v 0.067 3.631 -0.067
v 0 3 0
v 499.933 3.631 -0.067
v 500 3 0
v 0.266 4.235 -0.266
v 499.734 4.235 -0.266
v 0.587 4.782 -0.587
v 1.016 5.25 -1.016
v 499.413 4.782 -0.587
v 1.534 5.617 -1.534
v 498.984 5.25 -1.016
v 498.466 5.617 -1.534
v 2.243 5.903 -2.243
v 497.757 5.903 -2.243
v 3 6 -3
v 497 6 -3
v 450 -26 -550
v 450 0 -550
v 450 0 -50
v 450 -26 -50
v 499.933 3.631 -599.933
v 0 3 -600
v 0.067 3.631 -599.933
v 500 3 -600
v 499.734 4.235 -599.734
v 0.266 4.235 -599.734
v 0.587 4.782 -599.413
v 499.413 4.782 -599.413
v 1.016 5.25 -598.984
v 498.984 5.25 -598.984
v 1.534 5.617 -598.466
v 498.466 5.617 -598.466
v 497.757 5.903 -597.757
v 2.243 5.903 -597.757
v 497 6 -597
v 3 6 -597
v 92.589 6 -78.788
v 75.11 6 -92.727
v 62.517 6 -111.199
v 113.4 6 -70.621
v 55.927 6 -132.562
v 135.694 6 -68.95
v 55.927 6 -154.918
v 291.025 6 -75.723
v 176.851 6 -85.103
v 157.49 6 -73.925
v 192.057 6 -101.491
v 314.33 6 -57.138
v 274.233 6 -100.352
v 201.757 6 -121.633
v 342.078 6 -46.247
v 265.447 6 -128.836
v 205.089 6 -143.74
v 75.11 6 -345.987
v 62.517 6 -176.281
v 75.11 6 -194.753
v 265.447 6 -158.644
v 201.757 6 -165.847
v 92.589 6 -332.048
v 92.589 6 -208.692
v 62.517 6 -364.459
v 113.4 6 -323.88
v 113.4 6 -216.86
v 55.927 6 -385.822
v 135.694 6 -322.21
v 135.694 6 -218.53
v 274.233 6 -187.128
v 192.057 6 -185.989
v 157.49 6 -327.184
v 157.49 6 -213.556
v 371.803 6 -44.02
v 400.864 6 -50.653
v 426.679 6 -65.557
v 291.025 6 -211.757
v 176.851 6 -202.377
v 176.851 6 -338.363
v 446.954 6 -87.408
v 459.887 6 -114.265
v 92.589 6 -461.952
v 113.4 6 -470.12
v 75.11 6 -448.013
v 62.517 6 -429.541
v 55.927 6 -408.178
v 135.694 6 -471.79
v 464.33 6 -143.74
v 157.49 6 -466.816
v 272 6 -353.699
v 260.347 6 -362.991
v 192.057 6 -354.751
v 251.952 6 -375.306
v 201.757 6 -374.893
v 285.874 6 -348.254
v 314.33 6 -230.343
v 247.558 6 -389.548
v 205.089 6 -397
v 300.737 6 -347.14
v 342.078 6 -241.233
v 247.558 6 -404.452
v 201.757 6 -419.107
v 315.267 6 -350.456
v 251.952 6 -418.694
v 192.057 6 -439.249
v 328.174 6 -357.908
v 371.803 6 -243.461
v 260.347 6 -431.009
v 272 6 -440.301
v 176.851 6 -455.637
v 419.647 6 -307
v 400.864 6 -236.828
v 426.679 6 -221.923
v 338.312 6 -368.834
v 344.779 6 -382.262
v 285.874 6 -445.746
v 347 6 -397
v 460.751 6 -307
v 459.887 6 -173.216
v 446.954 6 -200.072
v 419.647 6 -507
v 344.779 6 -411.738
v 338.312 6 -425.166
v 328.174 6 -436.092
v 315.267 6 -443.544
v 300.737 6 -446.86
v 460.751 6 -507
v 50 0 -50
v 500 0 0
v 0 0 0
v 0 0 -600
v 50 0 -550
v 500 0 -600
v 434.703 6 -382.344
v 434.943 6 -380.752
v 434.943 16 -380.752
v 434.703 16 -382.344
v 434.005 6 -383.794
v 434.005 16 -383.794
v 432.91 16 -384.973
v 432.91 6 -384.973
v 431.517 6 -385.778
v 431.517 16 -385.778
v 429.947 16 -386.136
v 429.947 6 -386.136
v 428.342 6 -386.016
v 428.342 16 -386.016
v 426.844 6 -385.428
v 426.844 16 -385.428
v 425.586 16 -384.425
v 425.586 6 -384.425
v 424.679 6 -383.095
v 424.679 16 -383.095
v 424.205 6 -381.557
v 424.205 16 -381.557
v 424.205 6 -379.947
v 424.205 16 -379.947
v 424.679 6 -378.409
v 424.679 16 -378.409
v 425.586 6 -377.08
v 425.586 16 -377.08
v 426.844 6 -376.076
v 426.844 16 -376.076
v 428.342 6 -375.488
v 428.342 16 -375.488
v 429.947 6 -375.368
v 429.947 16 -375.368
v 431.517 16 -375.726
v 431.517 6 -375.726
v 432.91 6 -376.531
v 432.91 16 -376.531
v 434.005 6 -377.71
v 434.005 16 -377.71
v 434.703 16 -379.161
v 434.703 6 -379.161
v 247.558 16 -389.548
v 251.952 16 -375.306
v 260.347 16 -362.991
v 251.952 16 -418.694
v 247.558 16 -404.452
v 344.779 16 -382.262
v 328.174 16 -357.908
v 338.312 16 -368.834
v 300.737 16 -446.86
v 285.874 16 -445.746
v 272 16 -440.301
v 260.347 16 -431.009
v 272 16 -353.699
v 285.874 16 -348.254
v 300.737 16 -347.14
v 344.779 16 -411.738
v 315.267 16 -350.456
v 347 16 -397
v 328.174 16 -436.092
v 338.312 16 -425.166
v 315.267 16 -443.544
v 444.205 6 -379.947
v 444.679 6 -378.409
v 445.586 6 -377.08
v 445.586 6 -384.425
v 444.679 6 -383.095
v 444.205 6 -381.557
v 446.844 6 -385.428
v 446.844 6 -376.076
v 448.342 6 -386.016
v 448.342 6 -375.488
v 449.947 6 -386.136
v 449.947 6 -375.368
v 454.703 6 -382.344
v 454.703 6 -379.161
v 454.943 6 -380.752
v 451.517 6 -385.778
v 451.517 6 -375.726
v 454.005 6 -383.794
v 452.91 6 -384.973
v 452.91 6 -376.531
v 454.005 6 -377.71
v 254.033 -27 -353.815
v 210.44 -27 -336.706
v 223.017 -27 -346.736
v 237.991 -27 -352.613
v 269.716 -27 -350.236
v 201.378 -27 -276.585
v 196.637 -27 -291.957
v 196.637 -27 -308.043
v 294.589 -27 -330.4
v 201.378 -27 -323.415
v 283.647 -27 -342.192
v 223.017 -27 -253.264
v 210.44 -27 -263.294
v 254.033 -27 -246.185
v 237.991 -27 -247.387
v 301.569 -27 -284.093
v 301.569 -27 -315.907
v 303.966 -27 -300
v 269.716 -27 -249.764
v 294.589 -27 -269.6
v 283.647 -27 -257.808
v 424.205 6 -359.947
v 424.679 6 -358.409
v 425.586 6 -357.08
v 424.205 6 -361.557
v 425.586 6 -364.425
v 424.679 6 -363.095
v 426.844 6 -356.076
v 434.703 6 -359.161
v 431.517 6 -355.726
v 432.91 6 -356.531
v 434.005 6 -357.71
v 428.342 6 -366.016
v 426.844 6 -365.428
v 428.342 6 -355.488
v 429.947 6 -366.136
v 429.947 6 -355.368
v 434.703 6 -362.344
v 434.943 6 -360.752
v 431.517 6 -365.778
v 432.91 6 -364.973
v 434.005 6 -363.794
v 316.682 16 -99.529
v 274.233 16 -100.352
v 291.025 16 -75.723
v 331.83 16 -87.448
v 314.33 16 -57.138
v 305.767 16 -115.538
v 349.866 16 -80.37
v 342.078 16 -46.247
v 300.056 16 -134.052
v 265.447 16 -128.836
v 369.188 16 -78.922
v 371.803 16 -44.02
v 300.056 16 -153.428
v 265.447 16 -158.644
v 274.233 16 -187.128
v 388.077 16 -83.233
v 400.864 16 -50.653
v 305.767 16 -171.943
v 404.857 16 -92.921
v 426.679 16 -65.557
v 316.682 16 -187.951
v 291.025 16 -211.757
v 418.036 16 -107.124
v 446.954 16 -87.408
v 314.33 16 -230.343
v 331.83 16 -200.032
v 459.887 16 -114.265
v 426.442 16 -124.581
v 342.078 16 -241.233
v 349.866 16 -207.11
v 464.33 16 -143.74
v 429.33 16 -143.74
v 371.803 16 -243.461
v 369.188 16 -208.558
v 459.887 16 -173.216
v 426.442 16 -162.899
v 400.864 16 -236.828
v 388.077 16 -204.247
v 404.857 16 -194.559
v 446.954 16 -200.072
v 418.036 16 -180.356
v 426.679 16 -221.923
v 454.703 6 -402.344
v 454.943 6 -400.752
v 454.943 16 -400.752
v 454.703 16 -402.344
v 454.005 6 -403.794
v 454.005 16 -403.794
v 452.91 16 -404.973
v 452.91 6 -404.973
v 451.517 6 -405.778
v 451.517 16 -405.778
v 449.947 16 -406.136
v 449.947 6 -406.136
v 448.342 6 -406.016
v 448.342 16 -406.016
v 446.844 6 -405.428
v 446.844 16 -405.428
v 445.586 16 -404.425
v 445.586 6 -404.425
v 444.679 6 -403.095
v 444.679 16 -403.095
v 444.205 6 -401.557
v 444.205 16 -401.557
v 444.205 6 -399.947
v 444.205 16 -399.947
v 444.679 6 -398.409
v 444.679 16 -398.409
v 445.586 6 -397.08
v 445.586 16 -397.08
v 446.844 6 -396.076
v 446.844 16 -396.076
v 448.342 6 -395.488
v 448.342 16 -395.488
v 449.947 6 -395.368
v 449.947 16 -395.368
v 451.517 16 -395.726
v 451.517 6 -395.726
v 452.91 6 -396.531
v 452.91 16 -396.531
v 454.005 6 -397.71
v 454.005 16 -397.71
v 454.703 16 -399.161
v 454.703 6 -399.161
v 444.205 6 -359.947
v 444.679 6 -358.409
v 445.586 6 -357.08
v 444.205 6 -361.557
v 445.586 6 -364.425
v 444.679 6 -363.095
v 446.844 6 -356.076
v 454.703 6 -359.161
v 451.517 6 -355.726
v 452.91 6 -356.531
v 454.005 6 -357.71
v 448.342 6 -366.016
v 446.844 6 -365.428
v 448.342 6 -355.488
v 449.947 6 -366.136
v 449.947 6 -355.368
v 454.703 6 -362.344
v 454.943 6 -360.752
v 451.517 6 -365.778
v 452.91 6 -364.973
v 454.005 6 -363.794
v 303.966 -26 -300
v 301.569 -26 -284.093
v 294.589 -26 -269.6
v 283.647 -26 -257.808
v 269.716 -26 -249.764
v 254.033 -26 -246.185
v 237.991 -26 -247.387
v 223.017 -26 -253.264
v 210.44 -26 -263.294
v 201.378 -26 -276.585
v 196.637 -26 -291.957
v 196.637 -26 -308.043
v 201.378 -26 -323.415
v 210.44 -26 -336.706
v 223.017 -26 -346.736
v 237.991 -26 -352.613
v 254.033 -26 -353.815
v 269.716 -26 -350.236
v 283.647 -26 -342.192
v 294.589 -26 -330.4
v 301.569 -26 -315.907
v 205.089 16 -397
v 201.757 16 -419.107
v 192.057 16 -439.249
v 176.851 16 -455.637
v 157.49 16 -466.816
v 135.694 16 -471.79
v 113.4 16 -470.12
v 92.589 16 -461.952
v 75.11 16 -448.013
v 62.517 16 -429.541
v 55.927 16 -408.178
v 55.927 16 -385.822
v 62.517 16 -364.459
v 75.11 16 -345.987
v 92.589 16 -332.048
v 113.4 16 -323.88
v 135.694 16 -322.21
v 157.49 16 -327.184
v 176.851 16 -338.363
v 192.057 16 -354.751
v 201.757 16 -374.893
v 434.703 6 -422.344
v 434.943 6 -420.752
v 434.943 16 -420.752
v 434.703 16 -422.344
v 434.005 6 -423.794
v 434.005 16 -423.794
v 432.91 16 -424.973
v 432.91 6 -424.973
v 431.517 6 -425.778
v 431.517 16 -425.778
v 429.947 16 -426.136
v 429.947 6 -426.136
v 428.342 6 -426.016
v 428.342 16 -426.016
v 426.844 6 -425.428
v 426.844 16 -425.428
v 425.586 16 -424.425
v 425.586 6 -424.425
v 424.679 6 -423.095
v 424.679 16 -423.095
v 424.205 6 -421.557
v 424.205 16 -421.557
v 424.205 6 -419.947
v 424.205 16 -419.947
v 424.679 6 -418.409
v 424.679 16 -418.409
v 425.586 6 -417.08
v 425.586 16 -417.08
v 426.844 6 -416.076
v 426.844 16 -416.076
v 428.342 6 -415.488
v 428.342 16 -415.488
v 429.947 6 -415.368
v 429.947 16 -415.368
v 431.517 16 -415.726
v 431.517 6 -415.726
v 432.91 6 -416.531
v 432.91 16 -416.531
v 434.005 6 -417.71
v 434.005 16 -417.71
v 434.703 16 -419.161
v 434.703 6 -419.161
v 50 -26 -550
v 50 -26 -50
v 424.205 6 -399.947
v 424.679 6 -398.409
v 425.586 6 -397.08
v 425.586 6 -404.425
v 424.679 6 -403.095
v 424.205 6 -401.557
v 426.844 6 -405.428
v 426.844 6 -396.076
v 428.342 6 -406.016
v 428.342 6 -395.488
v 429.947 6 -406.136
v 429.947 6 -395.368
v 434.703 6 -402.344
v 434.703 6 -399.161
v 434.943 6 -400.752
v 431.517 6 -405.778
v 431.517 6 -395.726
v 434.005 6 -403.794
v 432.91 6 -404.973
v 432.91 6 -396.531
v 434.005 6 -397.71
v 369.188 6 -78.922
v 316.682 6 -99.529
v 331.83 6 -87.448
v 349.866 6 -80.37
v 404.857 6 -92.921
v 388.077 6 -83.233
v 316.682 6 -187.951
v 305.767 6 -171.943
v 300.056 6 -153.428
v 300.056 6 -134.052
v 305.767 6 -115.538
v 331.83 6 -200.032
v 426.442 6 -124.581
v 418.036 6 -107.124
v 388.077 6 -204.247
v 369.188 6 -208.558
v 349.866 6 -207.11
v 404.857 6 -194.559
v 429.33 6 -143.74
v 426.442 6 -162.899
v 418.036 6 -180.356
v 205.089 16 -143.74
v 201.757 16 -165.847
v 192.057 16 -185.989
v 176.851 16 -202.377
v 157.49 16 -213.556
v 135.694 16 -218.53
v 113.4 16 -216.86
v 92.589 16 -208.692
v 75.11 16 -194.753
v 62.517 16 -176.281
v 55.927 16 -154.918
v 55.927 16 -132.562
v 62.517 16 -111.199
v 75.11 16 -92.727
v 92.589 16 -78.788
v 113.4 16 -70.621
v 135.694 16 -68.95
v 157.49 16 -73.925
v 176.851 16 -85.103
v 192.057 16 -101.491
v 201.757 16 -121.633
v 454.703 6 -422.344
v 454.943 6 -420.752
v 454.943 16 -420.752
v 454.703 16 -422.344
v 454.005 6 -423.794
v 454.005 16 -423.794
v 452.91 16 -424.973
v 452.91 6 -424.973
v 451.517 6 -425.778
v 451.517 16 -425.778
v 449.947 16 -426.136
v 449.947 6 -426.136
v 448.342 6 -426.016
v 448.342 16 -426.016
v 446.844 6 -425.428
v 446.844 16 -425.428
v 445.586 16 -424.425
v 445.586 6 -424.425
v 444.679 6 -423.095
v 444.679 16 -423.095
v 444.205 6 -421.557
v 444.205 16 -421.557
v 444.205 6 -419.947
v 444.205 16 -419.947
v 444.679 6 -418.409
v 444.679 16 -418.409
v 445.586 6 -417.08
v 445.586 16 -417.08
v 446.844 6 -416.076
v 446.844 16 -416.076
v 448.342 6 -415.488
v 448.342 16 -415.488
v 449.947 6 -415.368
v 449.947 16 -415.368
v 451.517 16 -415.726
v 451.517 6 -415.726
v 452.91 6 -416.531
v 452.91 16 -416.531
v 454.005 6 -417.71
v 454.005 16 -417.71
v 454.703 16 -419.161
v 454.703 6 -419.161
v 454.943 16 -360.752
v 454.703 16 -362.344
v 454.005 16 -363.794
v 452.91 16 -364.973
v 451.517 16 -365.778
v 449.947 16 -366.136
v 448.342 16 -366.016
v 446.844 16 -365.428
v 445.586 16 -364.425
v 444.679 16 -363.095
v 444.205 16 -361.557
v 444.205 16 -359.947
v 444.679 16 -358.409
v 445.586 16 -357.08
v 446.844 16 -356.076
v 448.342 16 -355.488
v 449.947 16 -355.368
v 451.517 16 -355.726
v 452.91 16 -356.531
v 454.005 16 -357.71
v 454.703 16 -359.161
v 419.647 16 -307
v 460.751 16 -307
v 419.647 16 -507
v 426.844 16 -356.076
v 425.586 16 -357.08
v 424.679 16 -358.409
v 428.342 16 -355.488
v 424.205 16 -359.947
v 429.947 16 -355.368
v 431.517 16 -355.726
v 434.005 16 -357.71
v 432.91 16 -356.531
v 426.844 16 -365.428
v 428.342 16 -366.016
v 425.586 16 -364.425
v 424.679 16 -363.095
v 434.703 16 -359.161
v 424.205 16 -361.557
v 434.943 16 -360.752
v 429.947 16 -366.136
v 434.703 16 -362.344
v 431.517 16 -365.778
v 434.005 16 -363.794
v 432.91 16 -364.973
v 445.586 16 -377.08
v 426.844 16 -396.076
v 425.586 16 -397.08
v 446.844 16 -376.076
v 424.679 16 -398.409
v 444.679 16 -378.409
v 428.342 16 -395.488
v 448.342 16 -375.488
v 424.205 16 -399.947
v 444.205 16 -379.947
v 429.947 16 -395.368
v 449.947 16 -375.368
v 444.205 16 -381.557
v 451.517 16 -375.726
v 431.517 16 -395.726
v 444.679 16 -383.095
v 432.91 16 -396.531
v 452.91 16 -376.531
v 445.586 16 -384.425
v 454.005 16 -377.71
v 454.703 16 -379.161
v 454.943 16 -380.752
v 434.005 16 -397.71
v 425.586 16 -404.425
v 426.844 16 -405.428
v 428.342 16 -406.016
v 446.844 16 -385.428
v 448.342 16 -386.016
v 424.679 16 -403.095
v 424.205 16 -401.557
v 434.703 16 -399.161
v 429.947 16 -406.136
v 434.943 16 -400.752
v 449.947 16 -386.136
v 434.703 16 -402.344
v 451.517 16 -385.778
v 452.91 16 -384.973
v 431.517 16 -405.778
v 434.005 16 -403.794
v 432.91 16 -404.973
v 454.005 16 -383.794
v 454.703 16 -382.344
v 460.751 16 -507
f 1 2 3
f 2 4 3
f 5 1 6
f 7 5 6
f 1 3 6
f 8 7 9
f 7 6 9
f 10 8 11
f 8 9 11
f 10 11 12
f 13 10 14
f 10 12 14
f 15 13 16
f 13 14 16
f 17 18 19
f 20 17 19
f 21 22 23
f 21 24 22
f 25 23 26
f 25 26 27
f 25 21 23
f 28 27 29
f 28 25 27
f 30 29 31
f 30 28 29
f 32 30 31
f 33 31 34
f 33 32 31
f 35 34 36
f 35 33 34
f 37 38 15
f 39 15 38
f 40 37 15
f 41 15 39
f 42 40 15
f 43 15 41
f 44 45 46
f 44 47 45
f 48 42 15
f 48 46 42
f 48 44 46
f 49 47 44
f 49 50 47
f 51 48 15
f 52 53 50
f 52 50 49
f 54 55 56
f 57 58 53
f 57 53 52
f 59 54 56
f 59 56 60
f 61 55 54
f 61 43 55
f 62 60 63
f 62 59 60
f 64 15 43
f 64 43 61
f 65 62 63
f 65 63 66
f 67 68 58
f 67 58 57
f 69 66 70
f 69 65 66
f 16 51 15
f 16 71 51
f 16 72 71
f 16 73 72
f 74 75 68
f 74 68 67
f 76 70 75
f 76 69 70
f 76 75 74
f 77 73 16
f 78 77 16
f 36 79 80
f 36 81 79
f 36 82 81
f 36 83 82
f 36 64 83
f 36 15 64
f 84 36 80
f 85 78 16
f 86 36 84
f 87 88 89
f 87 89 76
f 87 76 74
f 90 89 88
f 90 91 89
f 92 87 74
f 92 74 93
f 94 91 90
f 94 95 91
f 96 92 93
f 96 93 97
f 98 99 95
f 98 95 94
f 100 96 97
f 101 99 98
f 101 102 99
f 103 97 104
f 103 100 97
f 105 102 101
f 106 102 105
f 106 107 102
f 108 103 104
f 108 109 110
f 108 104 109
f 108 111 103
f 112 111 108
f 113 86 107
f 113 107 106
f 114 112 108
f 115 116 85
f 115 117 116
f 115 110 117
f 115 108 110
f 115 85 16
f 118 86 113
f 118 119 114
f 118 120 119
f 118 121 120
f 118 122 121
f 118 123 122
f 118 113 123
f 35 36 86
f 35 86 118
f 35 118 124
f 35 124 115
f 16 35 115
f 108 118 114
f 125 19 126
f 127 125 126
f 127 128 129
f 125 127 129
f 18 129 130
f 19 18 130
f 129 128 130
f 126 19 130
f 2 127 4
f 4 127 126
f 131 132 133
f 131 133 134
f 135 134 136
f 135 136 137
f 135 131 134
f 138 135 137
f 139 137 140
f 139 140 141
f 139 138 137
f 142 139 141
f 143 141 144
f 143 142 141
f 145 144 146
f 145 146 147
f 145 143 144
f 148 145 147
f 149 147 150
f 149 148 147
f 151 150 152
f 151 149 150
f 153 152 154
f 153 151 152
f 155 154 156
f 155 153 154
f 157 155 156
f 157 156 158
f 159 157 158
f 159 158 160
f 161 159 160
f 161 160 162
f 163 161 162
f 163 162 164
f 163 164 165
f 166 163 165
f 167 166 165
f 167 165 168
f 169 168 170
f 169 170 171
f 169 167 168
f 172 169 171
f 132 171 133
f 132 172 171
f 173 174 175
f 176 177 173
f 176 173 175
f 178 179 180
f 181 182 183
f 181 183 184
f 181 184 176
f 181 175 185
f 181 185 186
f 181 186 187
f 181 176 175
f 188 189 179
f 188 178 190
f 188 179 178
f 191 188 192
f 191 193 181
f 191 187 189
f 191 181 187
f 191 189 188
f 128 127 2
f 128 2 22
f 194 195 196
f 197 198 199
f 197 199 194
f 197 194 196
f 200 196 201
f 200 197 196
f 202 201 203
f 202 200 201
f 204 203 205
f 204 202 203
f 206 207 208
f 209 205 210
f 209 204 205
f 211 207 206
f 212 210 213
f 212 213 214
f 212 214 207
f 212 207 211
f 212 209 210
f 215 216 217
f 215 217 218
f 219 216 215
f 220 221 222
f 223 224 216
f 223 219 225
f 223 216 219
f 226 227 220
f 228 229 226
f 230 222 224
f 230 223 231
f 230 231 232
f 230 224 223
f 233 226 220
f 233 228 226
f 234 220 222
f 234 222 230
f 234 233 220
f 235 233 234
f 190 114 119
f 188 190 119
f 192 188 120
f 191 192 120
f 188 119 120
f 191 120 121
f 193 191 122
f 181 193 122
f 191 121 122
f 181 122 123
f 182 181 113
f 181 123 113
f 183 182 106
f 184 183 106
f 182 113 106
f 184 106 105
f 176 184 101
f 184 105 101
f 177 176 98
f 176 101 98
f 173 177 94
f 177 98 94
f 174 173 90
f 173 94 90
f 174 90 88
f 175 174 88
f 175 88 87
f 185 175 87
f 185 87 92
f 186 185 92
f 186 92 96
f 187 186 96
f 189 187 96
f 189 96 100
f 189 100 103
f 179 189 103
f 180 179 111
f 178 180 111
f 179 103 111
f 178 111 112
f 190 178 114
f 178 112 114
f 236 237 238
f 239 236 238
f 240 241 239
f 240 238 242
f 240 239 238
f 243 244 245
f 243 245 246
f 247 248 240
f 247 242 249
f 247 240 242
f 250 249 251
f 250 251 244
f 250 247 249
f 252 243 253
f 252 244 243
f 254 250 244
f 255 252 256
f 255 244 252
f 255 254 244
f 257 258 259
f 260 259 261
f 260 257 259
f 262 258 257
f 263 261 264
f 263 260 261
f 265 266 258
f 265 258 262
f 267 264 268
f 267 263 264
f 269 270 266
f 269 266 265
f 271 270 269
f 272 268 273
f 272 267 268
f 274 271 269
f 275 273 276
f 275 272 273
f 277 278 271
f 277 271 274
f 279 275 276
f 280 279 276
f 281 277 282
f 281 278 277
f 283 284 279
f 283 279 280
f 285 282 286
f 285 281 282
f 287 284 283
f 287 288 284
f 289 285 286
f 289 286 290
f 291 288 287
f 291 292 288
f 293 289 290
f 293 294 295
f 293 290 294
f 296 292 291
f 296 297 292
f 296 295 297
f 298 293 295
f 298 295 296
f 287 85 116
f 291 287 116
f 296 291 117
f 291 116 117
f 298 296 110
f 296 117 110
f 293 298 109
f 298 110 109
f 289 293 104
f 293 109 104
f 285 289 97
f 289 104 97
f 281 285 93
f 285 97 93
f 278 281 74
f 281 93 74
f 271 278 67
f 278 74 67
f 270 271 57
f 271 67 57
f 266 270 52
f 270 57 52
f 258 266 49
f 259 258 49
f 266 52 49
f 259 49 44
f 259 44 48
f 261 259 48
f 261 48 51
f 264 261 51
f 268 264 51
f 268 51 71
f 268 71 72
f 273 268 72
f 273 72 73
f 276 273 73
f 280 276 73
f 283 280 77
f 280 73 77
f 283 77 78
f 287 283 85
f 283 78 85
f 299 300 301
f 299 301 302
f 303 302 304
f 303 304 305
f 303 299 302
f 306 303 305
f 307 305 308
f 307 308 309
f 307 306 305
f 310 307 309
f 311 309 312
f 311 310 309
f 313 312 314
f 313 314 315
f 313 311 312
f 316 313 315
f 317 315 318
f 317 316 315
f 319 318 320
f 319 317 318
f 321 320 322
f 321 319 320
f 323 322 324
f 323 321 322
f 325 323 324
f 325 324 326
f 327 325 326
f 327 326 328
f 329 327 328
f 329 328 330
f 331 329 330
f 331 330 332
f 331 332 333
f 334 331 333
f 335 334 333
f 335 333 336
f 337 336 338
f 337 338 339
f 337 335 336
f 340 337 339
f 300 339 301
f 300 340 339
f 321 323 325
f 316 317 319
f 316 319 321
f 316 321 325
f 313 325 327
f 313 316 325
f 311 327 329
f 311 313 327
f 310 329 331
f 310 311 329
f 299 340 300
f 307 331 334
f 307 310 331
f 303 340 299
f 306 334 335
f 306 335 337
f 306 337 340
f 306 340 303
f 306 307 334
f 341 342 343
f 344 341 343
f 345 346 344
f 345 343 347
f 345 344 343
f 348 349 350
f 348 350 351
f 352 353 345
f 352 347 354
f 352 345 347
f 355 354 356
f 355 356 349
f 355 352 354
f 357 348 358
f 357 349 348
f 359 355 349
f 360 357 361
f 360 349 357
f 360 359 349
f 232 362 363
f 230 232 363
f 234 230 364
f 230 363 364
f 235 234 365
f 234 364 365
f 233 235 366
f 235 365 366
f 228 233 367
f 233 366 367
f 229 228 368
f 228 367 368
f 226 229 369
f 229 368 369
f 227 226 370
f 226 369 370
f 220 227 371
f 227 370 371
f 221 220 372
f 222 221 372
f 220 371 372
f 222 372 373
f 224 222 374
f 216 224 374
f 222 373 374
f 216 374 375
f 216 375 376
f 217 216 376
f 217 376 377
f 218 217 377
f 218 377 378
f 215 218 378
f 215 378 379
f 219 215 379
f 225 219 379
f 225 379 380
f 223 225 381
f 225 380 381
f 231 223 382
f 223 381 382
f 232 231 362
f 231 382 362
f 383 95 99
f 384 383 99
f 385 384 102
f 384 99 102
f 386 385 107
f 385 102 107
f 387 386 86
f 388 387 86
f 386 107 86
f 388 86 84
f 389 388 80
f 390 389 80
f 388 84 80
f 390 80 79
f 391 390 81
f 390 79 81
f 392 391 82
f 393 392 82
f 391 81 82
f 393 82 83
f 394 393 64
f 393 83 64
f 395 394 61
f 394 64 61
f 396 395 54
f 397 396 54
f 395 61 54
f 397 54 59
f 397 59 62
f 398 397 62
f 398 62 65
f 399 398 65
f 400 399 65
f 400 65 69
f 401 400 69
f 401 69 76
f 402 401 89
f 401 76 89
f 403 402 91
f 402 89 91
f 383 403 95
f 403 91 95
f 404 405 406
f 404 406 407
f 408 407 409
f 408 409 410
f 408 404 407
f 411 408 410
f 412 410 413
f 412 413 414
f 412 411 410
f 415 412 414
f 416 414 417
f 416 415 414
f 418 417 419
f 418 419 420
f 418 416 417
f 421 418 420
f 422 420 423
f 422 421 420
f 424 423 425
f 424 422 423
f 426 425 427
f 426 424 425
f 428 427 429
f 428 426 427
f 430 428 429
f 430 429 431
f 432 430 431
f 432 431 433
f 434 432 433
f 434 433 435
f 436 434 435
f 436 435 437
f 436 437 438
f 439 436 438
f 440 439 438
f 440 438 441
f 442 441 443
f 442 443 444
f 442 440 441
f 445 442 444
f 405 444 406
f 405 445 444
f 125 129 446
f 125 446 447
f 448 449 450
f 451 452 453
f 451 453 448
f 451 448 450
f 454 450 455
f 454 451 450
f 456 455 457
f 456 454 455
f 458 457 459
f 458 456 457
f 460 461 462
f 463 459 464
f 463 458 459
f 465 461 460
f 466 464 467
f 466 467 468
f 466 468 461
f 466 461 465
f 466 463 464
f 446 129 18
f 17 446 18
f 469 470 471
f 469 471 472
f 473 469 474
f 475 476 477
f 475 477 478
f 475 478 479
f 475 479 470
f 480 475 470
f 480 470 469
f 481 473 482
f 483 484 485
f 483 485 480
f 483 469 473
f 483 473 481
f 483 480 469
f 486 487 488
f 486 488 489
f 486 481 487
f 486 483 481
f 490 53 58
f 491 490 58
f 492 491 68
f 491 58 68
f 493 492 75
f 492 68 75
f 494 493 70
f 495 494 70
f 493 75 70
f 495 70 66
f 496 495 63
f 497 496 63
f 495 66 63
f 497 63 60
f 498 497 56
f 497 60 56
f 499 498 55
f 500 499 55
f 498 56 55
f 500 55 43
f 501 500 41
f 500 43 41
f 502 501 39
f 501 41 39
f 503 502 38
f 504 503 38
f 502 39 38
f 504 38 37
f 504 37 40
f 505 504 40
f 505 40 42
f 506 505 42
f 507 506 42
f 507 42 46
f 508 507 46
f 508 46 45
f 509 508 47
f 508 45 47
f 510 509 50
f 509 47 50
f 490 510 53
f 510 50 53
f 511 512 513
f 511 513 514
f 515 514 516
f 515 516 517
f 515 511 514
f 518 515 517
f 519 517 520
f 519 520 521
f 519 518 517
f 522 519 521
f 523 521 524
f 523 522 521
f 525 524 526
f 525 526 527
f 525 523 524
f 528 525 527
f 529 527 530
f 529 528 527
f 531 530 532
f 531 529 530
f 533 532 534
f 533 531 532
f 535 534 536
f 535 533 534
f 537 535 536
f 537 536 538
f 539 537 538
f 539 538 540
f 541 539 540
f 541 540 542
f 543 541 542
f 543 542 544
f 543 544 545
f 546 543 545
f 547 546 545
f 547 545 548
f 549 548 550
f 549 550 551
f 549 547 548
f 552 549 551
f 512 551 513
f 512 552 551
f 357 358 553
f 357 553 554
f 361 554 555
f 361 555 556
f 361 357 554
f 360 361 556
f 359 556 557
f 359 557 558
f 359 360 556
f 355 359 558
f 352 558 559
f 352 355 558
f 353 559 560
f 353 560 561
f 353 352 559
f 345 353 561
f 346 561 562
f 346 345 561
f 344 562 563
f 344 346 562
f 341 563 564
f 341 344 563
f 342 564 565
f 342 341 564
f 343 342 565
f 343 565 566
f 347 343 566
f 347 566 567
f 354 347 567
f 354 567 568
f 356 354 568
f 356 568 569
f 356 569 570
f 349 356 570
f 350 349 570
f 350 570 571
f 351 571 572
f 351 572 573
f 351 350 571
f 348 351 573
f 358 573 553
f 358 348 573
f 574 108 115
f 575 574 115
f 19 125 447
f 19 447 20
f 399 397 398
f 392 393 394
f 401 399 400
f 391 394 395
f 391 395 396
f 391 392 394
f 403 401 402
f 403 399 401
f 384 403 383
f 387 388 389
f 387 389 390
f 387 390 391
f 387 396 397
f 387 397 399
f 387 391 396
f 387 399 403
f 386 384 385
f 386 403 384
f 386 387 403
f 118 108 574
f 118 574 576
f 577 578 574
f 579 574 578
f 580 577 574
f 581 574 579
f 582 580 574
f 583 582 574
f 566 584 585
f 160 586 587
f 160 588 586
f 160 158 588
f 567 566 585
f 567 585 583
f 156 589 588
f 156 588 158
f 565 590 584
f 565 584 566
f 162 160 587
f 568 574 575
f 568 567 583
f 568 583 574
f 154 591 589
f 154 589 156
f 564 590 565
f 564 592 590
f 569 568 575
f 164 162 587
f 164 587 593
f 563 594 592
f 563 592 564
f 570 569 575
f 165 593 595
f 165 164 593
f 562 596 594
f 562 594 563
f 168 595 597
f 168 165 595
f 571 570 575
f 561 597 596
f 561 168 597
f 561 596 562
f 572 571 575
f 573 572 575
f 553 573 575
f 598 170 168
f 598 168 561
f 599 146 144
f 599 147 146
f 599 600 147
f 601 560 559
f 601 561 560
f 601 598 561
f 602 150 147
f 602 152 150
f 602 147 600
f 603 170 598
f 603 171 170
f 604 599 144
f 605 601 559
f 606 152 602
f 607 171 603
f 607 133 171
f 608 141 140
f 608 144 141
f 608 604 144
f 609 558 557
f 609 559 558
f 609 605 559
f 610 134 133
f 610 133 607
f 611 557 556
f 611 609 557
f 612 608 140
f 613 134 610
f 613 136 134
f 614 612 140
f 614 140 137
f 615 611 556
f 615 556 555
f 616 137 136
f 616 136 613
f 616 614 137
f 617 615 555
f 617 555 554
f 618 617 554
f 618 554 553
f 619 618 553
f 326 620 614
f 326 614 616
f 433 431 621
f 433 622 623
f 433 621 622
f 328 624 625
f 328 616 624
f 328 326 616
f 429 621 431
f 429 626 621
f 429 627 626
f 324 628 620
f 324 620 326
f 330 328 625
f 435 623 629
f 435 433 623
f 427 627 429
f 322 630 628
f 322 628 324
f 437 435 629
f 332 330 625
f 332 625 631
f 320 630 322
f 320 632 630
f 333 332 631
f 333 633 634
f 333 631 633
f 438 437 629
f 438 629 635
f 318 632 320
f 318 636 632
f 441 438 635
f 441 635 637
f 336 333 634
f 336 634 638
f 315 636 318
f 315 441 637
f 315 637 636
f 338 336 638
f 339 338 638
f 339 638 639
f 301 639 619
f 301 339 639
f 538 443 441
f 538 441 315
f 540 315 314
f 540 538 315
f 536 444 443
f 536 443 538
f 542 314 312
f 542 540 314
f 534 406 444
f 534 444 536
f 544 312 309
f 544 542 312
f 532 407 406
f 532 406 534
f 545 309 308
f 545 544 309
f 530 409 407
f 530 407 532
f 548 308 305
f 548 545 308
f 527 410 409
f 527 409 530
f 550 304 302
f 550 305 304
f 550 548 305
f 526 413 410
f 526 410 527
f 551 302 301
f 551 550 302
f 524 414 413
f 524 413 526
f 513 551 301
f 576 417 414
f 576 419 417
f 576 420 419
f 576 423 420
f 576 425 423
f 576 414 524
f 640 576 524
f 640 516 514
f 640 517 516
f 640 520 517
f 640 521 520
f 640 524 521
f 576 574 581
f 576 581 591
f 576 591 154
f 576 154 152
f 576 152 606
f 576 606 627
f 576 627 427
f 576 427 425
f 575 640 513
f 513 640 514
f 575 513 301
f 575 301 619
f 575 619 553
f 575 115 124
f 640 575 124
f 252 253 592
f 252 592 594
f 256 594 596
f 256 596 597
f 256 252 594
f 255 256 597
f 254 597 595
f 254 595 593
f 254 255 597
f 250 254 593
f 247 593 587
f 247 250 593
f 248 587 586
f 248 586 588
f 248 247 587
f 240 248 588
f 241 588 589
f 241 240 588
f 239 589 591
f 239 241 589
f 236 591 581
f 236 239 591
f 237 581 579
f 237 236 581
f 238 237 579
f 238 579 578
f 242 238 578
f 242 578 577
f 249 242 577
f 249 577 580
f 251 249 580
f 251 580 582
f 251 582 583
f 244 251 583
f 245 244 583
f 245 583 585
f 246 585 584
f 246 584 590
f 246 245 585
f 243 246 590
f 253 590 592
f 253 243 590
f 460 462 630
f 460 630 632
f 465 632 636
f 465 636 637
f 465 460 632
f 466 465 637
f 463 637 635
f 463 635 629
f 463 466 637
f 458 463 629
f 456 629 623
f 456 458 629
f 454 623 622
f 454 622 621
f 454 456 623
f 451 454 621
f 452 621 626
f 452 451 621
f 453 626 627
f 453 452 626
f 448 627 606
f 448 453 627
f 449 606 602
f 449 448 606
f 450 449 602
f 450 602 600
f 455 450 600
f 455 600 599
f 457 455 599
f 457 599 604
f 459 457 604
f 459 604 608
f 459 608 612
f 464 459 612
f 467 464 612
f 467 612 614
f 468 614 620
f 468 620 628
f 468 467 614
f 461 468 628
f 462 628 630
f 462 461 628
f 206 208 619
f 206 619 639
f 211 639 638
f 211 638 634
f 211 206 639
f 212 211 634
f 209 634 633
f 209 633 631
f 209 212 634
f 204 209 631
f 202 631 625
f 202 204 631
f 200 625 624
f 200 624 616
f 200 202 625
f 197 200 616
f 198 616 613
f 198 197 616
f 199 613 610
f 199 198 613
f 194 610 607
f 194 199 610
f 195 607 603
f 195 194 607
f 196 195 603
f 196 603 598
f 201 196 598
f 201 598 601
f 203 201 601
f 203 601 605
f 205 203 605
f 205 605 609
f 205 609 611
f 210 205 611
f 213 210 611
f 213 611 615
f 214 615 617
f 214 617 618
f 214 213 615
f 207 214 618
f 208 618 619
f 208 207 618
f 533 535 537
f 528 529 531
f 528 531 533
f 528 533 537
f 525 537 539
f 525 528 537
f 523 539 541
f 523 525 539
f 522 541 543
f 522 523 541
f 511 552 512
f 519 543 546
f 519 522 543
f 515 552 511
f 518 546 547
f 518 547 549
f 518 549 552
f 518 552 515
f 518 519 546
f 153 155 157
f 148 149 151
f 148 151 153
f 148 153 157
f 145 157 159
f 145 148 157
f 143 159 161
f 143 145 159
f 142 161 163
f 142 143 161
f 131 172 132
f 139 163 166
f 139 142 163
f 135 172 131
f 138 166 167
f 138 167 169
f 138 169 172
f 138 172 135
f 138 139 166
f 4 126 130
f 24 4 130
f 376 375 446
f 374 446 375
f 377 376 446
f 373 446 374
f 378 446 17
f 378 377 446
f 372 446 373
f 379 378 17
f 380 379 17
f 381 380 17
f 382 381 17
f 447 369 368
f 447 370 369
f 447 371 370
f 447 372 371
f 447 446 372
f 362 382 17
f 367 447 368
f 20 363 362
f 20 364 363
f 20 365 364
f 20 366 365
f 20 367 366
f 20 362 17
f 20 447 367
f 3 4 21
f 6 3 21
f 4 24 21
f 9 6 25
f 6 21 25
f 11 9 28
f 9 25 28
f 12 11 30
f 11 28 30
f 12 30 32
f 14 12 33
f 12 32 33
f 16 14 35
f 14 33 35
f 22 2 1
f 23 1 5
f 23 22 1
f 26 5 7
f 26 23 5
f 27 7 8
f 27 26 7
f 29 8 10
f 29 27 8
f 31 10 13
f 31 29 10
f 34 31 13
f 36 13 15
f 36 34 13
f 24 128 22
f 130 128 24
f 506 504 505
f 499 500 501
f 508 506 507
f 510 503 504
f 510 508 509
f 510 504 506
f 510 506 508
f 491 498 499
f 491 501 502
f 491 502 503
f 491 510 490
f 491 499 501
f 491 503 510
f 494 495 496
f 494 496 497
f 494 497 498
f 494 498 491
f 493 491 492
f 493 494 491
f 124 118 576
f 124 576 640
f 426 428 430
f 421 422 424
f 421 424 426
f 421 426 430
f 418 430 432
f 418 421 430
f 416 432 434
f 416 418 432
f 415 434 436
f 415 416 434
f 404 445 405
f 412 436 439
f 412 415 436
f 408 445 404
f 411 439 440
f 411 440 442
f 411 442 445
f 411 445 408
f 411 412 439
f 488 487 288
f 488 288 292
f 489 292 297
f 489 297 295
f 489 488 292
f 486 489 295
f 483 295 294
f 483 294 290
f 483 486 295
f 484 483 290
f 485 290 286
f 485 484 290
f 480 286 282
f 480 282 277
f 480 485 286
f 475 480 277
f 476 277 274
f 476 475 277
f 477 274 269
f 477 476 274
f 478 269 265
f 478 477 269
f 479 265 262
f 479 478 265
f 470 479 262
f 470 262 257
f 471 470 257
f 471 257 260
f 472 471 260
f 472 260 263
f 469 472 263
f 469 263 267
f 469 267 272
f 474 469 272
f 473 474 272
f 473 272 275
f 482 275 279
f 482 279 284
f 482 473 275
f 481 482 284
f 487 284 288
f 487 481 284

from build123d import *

# Parameters (mm, degrees)
SKETCH1_W           = 500
SKETCH1_H           = 600
BOSS_EXTRUDE1_DEPTH = 6
FILLET1_R           = 3
SKETCH3_W           = 400
SKETCH3_H           = 500
BOSS_EXTRUDE2_DEPTH = 26
SKETCH2_R           = 75
SKETCH2_R_2         = 50
SKETCH2_R_3         = 100
SKETCH2_R_4         = 65
SKETCH2_W           = 41.104529262
SKETCH2_H           = 200
SKETCH2_R_5         = 5.399416509
BOSS_EXTRUDE3_DEPTH = 10
SKETCH4_R           = 53.966181138
BOSS_EXTRUDE4_DEPTH = 1


with BuildPart() as part:
    # Sketch1 → Boss-Extrude1 (new body)
    with BuildSketch(Plane(origin=(0, 0, 0), x_dir=(1, 0, 0), z_dir=(0, 1, 0))):
        with Locations((250, 300)):
            Rectangle(SKETCH1_W, SKETCH1_H)
    extrude(amount=BOSS_EXTRUDE1_DEPTH)

    # Fillet1
    fillet1_edges = [part.edges().sort_by_distance(p)[0] for p in [
        (500, 6, -300),
        (250, 6, -600),
        (0, 6, -300),
        (250, 6, 0),
    ]]
    fillet(fillet1_edges, radius=FILLET1_R)

    # Sketch3 → Boss-Extrude2 (add)
    with BuildSketch(Plane.XZ):
        with Locations((250, -300)):
            Rectangle(SKETCH3_W, SKETCH3_H)
    extrude(amount=BOSS_EXTRUDE2_DEPTH)

    # Sketch2 → Boss-Extrude3 (add)
    with BuildSketch(Plane(origin=(0, 6, 0), x_dir=(1, 0, 0), z_dir=(0, 1, 0))):
        with Locations((130.089337479, 397)):
            Circle(SKETCH2_R)
        with Locations((297, 397)):
            Circle(SKETCH2_R_2)
        with Locations((130.089337479, 143.740125968)):
            Circle(SKETCH2_R)
        with Locations((364.330089408, 143.740125968)):
            Circle(SKETCH2_R_3)
        with Locations((364.330089408, 143.740125968)):
            Circle(SKETCH2_R_4, mode=Mode.SUBTRACT)
        with Locations((440.198970532, 407)):
            Rectangle(SKETCH2_W, SKETCH2_H)
        with Locations((449.543954361, 420.752043301)):
            Circle(SKETCH2_R_5, mode=Mode.SUBTRACT)
        with Locations((429.543954361, 420.752043301)):
            Circle(SKETCH2_R_5, mode=Mode.SUBTRACT)
        with Locations((429.543954361, 400.752043301)):
            Circle(SKETCH2_R_5, mode=Mode.SUBTRACT)
        with Locations((429.543954361, 380.752043301)):
            Circle(SKETCH2_R_5, mode=Mode.SUBTRACT)
        with Locations((429.543954361, 360.752043301)):
            Circle(SKETCH2_R_5, mode=Mode.SUBTRACT)
        with Locations((449.543954361, 400.752043301)):
            Circle(SKETCH2_R_5, mode=Mode.SUBTRACT)
        with Locations((449.543954361, 380.752043301)):
            Circle(SKETCH2_R_5, mode=Mode.SUBTRACT)
        with Locations((449.543954361, 360.752043301)):
            Circle(SKETCH2_R_5, mode=Mode.SUBTRACT)
    extrude(amount=BOSS_EXTRUDE3_DEPTH)

    # Sketch4 → Boss-Extrude4 (add)
    with BuildSketch(Plane.XZ.offset(26)):
        with Locations((250, -300)):
            Circle(SKETCH4_R)
    extrude(amount=BOSS_EXTRUDE4_DEPTH)


solid = part.part
